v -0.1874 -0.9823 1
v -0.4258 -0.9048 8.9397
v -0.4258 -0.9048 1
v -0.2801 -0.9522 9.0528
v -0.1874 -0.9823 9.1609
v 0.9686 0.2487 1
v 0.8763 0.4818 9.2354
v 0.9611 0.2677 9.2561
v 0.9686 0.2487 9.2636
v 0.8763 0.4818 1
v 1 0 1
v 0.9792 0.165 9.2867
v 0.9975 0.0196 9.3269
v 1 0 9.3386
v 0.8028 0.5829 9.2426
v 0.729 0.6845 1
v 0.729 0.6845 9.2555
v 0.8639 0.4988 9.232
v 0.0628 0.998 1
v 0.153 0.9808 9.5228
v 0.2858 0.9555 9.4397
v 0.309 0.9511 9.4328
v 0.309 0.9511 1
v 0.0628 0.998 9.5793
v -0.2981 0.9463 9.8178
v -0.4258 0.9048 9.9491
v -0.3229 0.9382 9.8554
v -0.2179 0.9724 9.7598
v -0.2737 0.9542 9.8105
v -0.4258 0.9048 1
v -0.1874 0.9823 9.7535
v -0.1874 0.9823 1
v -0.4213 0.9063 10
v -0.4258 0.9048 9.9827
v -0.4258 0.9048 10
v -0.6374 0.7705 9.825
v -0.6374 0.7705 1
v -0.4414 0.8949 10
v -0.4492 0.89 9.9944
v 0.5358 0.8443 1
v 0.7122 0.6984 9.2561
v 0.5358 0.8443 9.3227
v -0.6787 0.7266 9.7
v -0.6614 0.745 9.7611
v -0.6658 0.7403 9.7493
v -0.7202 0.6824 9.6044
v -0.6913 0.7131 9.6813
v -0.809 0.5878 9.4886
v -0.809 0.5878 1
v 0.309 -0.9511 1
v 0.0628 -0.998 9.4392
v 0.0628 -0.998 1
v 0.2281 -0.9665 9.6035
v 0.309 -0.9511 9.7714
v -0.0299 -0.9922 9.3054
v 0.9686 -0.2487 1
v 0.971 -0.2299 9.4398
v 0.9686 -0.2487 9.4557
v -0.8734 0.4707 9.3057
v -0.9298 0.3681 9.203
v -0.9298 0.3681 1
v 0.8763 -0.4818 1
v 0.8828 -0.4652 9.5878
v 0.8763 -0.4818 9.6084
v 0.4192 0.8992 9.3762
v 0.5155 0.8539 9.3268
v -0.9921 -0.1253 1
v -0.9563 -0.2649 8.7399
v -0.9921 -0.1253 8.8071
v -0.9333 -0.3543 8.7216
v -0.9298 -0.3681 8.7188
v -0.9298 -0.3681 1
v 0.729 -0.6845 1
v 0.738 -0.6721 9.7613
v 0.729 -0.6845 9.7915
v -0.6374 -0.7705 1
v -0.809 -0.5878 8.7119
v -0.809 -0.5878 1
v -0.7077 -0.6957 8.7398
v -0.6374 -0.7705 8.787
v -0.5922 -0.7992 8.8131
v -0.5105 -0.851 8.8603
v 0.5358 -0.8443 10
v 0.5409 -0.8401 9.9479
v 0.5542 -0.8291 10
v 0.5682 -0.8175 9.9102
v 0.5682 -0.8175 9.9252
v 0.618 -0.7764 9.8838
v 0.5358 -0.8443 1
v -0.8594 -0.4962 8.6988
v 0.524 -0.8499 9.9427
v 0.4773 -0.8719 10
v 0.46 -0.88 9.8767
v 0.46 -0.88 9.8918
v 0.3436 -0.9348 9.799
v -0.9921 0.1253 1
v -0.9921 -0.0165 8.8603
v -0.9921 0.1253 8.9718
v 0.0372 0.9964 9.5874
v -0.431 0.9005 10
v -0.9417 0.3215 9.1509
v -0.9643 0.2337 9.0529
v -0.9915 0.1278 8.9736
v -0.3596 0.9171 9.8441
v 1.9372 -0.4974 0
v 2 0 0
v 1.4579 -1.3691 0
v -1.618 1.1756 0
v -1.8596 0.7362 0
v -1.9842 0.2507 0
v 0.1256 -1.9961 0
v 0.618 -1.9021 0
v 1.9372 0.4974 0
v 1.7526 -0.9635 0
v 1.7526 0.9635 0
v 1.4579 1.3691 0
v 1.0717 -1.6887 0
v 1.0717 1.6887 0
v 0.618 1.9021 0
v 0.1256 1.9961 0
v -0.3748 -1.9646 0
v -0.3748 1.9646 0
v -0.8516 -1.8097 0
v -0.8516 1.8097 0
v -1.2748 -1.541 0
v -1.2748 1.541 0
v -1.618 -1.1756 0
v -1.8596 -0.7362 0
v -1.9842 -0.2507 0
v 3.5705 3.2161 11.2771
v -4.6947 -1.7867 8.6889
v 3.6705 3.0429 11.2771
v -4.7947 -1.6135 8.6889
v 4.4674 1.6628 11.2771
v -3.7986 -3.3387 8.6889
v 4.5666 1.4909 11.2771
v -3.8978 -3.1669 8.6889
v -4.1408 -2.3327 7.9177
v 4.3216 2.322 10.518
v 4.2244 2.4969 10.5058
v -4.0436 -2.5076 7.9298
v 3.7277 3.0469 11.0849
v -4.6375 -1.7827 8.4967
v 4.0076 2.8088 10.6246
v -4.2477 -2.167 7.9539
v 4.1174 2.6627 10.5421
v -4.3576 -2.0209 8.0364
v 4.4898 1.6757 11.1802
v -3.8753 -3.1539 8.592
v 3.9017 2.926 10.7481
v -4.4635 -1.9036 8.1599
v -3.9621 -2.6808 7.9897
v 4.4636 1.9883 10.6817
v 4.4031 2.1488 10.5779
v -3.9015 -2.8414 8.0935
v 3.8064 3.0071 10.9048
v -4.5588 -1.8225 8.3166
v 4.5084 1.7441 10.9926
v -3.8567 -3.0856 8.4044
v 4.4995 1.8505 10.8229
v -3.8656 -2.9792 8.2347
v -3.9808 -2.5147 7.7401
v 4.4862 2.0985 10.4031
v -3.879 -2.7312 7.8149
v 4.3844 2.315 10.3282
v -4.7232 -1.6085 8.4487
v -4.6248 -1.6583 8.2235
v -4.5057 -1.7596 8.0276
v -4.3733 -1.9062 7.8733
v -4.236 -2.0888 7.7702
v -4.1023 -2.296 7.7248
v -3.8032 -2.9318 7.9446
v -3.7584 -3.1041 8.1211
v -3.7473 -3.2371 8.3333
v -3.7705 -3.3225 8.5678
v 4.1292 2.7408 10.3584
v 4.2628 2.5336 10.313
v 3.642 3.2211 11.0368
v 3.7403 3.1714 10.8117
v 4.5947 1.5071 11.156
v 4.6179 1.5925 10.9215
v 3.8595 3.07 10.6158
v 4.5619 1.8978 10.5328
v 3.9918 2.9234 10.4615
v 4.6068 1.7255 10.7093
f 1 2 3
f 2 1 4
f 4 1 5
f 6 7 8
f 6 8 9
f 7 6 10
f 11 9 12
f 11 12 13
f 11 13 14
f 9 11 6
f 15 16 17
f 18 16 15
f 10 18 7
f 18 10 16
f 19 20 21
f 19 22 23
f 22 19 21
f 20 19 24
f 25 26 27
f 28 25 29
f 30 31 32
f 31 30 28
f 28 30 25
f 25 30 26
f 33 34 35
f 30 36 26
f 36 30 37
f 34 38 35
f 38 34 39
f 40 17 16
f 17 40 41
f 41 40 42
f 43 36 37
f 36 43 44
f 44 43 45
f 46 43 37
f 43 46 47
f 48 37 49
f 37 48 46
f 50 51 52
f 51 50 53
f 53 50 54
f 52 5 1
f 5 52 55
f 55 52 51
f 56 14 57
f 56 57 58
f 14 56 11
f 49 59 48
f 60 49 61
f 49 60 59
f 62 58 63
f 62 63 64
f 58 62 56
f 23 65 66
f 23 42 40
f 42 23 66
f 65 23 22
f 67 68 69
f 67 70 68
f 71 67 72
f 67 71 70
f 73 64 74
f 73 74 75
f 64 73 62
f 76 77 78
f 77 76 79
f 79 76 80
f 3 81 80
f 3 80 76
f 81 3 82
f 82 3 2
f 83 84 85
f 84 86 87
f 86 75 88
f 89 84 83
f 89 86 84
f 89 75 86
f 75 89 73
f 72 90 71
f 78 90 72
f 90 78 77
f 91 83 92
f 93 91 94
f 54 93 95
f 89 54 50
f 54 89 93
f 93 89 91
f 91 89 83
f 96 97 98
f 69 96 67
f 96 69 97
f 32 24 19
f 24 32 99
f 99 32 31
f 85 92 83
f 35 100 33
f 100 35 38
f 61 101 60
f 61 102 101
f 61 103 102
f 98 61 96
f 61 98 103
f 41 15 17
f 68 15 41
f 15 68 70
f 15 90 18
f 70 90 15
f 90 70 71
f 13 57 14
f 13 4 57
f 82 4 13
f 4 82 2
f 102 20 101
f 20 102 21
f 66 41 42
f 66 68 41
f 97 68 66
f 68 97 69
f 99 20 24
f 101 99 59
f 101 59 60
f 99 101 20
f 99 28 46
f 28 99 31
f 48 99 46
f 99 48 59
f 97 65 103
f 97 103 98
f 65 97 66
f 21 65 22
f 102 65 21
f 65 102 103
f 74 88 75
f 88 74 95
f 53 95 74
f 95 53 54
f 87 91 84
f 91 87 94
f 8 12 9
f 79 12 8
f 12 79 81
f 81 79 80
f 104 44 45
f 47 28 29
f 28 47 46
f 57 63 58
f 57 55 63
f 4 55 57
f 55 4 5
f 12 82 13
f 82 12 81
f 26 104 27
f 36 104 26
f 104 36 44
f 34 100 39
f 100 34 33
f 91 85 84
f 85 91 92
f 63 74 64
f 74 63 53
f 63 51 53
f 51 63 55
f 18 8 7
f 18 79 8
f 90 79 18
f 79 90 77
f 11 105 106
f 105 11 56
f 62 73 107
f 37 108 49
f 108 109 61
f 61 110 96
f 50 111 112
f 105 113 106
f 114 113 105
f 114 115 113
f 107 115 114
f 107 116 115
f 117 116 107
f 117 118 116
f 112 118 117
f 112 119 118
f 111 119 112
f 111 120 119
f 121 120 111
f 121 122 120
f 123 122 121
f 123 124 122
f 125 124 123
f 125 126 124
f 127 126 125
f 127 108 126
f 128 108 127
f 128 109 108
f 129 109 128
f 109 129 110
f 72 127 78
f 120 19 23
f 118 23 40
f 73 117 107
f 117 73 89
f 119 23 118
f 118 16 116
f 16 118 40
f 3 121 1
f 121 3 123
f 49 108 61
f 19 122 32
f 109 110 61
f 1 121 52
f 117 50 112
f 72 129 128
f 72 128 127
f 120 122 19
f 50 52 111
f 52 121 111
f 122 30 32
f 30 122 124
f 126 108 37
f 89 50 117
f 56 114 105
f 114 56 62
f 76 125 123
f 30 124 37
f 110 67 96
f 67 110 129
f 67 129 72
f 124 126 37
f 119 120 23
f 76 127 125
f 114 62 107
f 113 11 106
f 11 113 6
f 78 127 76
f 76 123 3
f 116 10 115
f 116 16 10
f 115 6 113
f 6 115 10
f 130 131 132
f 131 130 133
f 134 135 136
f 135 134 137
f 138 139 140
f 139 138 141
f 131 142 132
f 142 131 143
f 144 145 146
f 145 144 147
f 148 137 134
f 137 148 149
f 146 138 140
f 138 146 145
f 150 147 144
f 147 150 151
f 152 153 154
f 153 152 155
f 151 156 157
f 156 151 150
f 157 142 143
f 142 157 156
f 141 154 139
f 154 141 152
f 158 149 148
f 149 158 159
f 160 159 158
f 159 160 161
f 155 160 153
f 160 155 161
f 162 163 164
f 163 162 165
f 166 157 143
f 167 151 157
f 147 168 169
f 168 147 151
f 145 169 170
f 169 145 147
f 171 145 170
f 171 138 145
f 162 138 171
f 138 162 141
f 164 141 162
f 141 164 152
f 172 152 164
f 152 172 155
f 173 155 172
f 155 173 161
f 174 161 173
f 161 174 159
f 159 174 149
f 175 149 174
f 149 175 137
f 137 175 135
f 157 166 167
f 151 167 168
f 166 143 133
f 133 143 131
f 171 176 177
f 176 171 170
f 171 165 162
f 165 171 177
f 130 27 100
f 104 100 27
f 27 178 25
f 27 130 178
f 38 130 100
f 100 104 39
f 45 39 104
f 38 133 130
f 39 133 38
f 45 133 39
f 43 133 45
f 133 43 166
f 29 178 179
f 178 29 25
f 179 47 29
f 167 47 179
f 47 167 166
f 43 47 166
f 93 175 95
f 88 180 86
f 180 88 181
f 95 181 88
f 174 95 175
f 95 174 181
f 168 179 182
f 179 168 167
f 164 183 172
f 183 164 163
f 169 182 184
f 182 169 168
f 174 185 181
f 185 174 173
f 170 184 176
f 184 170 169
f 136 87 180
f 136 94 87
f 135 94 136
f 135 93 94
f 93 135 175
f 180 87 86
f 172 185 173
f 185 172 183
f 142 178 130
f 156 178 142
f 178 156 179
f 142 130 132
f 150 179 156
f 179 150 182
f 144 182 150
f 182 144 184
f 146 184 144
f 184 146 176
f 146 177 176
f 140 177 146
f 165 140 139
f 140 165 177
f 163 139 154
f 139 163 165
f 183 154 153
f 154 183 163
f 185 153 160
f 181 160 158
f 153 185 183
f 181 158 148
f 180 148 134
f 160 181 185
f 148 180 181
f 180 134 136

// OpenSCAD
// file: base.scad
module base(r,h,$fn=$fn) {
    linear_extrude(h,scale = 0.5) {
        circle(r*2);
    }
}

base(1,1);
// file: support.scad
module support(h,r=1,dir=0,slope=90,$fn=$fn) {
    difference(){
        cylinder(h,r=r);
        translate([0,0,h])
        rotate([0,slope,dir])
        cylinder(h,r=r,center=true);
    }
}

support(10,1,dir=45,$fn=25);
// file: base_support.scad
use <support.scad>
use <base.scad>

module base_support(h=10,r=1,bh=1,dir=0,slope=90,$fn=$fn) {
    union() {
        base(r,bh);
        translate([0,0,bh])
        support(h-bh,r,dir,slope);
    }
}

base_support(10,1,bh=1,$fn=25);
// main file
use <base_support.scad>

$fn=25;

module track(length=1,radius=1,$fn=$fn) {
    translate([0,0,radius/2])
    rotate([90,0,0])
    difference(){
        cylinder(length,r=radius,center=true);
        union(){
            translate([-radius,0,-length/2-1])
            cube([radius*2,radius,length+2]);
            cylinder(length+1,r=radius*0.8,center=true);
        }
    };
}

module support_track(l=10,h=10,r=1,dir=0,slope=90,$fn=$fn){
    base_support(h,r,1,dir,slope);
    translate([0,0,h-0.5])
    rotate([slope-90,0,90+dir])
    track(l,r);
}

//track(25,5,$fn=25);

support_track(dir=30,slope=75);
